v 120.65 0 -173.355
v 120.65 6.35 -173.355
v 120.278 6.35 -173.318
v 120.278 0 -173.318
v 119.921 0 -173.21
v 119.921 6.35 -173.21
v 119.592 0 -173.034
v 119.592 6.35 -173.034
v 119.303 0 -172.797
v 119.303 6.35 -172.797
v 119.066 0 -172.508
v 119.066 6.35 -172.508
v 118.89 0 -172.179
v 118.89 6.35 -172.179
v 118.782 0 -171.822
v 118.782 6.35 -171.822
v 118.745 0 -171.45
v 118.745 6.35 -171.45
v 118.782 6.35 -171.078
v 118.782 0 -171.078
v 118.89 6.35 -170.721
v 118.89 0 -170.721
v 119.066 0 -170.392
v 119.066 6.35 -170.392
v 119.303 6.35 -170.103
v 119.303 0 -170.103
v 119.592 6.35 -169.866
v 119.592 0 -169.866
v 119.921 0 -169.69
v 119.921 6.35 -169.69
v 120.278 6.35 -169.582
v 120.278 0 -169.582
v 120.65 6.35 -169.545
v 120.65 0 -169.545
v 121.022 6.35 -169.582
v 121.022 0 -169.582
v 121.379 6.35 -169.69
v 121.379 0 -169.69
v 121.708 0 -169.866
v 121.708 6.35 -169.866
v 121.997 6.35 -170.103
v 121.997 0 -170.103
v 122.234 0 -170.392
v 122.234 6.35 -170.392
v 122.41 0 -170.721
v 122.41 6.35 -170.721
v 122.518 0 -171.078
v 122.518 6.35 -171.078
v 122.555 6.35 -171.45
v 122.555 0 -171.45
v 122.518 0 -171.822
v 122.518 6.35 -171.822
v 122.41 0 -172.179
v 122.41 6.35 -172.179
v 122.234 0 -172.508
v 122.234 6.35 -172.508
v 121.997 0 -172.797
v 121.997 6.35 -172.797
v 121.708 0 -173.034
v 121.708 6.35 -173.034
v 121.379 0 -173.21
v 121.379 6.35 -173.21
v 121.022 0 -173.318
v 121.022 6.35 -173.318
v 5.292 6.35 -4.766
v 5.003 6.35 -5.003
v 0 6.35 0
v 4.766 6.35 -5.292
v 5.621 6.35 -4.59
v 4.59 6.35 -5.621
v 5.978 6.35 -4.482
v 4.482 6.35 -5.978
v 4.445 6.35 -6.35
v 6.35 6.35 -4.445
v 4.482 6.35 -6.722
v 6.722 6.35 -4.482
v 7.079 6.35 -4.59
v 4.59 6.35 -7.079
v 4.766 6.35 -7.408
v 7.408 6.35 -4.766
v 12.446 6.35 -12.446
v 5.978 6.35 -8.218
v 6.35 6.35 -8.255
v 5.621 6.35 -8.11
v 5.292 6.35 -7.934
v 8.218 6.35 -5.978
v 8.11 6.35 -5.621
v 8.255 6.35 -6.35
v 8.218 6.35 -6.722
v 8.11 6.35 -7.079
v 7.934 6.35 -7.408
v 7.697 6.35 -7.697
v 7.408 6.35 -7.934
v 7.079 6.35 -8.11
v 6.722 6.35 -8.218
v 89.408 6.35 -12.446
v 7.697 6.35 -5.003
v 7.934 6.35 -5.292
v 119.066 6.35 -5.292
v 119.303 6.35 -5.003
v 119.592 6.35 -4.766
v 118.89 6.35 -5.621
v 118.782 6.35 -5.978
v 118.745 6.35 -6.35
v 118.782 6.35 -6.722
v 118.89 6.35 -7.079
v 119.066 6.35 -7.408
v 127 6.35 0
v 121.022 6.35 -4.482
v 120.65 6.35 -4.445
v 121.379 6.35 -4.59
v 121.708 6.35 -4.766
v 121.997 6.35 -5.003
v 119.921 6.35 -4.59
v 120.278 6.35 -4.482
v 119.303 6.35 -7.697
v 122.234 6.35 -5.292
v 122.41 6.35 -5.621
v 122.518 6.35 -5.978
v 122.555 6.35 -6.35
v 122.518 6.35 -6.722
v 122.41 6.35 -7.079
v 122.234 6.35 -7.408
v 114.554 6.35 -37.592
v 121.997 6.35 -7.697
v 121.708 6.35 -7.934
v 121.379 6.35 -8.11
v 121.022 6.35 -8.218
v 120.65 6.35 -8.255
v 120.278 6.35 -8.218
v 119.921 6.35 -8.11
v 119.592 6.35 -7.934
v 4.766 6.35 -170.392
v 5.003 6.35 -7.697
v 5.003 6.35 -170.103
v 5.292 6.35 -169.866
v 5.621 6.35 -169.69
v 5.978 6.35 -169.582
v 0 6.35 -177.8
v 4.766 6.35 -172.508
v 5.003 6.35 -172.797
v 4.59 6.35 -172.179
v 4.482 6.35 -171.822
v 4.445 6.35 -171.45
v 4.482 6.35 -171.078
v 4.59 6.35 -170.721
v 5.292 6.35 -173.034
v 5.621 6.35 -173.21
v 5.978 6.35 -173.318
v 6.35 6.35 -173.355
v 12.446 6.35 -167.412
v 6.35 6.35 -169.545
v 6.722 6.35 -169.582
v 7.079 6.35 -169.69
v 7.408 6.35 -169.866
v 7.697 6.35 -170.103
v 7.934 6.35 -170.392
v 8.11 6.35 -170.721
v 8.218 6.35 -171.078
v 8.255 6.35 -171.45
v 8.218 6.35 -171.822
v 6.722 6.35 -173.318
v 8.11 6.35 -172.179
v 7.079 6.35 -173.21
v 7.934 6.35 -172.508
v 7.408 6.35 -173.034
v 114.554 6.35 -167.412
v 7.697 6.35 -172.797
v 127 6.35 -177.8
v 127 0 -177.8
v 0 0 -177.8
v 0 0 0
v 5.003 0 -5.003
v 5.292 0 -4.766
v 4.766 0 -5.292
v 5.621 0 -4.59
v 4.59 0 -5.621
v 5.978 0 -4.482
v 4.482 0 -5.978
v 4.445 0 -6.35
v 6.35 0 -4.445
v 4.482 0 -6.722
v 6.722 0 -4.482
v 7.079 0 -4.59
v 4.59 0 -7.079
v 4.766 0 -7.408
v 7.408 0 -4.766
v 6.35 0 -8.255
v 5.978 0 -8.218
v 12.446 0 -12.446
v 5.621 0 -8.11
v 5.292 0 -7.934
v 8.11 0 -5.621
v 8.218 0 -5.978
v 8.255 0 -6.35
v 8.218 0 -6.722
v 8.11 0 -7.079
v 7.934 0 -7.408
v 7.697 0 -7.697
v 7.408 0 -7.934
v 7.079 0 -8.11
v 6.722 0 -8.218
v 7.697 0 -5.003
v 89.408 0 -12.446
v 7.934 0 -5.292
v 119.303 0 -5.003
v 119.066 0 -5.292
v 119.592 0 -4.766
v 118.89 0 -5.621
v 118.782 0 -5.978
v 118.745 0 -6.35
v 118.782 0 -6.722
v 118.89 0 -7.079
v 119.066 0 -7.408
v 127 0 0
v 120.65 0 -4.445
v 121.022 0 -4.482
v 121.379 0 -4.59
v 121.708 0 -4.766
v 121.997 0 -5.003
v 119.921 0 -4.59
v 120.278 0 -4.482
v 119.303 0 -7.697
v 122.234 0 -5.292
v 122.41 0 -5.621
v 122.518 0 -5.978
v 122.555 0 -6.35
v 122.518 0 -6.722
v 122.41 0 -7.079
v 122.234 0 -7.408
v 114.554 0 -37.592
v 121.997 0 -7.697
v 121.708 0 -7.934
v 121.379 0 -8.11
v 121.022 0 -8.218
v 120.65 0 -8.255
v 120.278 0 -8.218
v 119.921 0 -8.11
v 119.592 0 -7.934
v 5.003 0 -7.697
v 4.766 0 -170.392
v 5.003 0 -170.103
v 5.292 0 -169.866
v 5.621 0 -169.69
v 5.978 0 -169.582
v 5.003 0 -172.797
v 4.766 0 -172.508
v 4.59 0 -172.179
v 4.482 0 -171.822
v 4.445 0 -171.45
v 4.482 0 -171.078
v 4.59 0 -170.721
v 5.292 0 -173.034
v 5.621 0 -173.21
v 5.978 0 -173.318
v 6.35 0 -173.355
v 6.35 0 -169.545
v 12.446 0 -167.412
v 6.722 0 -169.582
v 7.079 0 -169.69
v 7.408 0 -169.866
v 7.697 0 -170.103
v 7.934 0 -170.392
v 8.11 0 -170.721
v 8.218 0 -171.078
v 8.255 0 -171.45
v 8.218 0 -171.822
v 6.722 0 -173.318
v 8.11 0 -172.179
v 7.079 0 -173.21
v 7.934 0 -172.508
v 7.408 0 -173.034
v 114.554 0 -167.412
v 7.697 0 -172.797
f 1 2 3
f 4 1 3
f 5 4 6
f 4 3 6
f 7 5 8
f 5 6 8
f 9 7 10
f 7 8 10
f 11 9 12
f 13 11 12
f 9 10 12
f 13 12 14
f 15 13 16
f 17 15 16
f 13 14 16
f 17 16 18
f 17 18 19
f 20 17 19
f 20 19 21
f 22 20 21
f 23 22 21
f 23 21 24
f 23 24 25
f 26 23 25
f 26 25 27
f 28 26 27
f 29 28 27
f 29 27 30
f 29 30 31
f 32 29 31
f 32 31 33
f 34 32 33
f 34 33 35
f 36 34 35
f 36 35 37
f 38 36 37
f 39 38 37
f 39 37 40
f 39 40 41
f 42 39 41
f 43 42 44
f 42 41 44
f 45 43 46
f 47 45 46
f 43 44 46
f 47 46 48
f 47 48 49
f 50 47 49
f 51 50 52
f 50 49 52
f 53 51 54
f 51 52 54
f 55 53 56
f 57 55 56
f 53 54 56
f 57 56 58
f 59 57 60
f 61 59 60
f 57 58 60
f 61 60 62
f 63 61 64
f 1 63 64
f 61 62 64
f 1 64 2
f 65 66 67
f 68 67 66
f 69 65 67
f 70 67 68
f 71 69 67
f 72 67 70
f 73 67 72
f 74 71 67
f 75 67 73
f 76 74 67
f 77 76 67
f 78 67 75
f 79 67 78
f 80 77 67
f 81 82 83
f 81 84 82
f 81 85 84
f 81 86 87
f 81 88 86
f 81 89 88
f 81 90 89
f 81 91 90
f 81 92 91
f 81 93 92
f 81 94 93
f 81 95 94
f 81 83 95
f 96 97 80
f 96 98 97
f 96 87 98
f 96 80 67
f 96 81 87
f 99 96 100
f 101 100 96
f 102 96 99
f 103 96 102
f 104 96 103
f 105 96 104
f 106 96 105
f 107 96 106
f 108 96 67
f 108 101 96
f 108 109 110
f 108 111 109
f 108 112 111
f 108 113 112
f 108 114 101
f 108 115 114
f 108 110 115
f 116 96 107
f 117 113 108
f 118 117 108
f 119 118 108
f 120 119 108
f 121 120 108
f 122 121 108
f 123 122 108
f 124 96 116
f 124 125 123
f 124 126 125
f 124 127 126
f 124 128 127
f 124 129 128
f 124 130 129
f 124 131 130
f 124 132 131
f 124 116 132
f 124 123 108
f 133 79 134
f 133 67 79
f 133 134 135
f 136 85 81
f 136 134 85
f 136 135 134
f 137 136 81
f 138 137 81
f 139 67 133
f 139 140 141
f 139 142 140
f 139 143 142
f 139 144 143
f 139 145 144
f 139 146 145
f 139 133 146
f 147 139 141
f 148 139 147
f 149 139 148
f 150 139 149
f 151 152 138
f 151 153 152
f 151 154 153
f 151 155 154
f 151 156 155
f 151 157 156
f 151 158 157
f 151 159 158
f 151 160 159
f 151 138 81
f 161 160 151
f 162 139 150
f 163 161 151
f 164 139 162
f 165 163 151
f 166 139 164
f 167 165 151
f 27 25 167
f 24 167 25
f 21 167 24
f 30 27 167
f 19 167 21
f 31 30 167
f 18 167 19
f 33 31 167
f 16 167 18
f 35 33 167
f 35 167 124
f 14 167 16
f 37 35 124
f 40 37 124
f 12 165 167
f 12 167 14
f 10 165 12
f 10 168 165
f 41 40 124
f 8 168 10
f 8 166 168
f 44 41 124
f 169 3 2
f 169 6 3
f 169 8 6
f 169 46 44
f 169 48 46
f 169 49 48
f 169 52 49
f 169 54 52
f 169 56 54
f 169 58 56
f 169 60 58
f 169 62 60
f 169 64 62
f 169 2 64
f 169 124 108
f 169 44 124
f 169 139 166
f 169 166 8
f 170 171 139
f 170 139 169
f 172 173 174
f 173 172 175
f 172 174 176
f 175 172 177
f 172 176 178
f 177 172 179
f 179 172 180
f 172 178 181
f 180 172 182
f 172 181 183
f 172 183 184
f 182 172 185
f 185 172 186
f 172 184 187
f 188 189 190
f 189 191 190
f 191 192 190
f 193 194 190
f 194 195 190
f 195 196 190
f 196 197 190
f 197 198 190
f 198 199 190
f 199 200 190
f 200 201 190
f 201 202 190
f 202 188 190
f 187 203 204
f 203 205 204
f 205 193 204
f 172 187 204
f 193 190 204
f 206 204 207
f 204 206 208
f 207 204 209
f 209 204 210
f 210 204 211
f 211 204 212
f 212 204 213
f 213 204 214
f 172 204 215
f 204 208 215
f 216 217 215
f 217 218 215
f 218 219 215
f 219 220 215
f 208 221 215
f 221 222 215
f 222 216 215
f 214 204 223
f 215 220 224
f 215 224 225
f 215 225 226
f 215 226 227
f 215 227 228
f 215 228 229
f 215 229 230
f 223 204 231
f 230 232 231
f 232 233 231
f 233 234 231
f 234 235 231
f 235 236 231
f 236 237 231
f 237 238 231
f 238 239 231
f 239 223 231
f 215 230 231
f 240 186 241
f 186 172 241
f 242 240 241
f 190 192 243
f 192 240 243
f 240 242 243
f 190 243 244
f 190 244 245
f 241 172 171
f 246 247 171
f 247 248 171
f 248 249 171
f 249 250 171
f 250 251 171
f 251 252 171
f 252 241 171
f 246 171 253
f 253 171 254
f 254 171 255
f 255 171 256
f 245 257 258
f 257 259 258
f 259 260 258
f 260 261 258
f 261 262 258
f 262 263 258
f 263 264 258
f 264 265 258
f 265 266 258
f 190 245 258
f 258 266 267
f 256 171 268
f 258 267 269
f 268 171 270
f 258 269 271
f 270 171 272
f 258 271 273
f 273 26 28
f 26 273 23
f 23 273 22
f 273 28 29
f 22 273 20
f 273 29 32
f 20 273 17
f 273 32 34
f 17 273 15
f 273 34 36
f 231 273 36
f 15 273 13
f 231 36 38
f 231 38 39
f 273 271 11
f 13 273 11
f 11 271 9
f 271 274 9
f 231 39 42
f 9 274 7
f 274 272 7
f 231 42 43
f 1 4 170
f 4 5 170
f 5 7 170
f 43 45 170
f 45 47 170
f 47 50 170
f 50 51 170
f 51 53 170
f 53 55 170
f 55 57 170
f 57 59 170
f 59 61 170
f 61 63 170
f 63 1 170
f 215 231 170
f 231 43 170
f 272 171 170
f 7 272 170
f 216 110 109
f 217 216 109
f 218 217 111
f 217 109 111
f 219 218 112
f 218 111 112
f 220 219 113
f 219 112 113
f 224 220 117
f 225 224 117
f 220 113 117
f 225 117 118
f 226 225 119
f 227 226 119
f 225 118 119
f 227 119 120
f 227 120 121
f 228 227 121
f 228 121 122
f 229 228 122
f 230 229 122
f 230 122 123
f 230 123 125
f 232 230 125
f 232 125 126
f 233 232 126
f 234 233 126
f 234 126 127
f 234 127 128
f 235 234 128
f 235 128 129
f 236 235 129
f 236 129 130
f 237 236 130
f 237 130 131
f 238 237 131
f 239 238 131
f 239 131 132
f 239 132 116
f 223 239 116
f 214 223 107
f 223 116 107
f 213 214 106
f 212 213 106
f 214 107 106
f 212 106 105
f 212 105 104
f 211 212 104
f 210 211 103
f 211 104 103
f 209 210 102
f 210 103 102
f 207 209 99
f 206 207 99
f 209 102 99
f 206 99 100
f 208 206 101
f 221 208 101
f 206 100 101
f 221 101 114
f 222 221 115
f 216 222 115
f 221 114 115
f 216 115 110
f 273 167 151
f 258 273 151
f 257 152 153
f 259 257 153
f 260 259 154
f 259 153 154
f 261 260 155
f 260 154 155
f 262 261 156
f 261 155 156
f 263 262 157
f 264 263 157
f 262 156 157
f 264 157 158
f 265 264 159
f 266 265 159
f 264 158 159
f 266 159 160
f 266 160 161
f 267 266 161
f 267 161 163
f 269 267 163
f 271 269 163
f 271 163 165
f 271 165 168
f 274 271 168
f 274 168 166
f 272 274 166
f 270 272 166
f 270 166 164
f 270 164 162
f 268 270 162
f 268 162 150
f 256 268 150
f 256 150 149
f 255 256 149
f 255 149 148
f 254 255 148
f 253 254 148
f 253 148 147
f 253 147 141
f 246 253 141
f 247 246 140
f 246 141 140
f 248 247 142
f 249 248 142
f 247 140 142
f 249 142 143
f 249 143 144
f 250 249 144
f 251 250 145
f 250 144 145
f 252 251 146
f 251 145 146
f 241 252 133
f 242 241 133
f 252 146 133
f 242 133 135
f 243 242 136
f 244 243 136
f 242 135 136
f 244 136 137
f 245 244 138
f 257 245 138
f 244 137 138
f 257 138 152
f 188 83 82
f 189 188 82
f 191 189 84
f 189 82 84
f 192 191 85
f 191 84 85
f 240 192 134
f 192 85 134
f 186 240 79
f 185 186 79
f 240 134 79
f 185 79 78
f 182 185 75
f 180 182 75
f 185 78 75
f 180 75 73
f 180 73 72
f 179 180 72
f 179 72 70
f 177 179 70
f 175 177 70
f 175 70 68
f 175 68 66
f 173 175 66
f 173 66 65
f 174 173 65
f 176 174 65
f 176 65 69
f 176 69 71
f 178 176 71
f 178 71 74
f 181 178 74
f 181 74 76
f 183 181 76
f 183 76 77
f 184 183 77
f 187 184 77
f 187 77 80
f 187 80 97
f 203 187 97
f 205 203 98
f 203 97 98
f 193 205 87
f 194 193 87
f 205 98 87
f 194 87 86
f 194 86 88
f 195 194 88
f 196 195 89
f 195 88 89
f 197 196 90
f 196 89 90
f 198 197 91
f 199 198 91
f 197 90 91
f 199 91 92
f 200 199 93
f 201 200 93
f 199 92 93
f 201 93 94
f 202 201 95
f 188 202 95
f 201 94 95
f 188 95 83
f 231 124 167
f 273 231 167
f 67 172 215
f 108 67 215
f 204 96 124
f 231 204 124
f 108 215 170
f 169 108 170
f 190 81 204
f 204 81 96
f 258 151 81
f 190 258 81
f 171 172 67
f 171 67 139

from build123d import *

# Parameters (mm, degrees)
SKETCH1_W           = 127
SKETCH1_H           = 177.8
BOSS_EXTRUDE1_DEPTH = 6.35
CUT_EXTRUDE1_DEPTH  = 219.591313871
SKETCH3_R           = 1.905
CUT_EXTRUDE2_DEPTH  = 219.591313871


with BuildPart() as part:
    # Sketch1 → Boss-Extrude1 (new body)
    with BuildSketch(Plane(origin=(0, 0, 0), x_dir=(1, 0, 0), z_dir=(0, 1, 0))):
        with Locations((63.5, 88.9)):
            Rectangle(SKETCH1_W, SKETCH1_H)
    extrude(amount=BOSS_EXTRUDE1_DEPTH)

    # Sketch2 → Cut-Extrude1 (cut, through all)
    with BuildSketch(Plane(origin=(0, 6.35, 0), x_dir=(1, 0, 0), z_dir=(0, 1, 0))):
        Polygon((114.554, 167.411684877), (12.446, 167.411684877), (12.446, 12.446), (89.408, 12.446), (114.554, 37.592), align=None)
    extrude(amount=-CUT_EXTRUDE1_DEPTH, mode=Mode.SUBTRACT)

    # Sketch3 → Cut-Extrude2 (cut, through all)
    with BuildSketch(Plane(origin=(0, 6.35, 0), x_dir=(1, 0, 0), z_dir=(0, 1, 0))):
        with Locations(Location((6.35, 171.45, 0), (0, 0, 270))):
            Circle(SKETCH3_R)
        with Locations(Location((6.35, 6.35, 0), (0, 0, 90))):
            Circle(SKETCH3_R)
        with Locations(Location((120.65, 6.35, 0), (0, 0, 270))):
            Circle(SKETCH3_R)
        with Locations(Location((120.65, 171.45, 0), (0, 0, 90))):
            Circle(SKETCH3_R)
    extrude(amount=-CUT_EXTRUDE2_DEPTH, mode=Mode.SUBTRACT)


solid = part.part
